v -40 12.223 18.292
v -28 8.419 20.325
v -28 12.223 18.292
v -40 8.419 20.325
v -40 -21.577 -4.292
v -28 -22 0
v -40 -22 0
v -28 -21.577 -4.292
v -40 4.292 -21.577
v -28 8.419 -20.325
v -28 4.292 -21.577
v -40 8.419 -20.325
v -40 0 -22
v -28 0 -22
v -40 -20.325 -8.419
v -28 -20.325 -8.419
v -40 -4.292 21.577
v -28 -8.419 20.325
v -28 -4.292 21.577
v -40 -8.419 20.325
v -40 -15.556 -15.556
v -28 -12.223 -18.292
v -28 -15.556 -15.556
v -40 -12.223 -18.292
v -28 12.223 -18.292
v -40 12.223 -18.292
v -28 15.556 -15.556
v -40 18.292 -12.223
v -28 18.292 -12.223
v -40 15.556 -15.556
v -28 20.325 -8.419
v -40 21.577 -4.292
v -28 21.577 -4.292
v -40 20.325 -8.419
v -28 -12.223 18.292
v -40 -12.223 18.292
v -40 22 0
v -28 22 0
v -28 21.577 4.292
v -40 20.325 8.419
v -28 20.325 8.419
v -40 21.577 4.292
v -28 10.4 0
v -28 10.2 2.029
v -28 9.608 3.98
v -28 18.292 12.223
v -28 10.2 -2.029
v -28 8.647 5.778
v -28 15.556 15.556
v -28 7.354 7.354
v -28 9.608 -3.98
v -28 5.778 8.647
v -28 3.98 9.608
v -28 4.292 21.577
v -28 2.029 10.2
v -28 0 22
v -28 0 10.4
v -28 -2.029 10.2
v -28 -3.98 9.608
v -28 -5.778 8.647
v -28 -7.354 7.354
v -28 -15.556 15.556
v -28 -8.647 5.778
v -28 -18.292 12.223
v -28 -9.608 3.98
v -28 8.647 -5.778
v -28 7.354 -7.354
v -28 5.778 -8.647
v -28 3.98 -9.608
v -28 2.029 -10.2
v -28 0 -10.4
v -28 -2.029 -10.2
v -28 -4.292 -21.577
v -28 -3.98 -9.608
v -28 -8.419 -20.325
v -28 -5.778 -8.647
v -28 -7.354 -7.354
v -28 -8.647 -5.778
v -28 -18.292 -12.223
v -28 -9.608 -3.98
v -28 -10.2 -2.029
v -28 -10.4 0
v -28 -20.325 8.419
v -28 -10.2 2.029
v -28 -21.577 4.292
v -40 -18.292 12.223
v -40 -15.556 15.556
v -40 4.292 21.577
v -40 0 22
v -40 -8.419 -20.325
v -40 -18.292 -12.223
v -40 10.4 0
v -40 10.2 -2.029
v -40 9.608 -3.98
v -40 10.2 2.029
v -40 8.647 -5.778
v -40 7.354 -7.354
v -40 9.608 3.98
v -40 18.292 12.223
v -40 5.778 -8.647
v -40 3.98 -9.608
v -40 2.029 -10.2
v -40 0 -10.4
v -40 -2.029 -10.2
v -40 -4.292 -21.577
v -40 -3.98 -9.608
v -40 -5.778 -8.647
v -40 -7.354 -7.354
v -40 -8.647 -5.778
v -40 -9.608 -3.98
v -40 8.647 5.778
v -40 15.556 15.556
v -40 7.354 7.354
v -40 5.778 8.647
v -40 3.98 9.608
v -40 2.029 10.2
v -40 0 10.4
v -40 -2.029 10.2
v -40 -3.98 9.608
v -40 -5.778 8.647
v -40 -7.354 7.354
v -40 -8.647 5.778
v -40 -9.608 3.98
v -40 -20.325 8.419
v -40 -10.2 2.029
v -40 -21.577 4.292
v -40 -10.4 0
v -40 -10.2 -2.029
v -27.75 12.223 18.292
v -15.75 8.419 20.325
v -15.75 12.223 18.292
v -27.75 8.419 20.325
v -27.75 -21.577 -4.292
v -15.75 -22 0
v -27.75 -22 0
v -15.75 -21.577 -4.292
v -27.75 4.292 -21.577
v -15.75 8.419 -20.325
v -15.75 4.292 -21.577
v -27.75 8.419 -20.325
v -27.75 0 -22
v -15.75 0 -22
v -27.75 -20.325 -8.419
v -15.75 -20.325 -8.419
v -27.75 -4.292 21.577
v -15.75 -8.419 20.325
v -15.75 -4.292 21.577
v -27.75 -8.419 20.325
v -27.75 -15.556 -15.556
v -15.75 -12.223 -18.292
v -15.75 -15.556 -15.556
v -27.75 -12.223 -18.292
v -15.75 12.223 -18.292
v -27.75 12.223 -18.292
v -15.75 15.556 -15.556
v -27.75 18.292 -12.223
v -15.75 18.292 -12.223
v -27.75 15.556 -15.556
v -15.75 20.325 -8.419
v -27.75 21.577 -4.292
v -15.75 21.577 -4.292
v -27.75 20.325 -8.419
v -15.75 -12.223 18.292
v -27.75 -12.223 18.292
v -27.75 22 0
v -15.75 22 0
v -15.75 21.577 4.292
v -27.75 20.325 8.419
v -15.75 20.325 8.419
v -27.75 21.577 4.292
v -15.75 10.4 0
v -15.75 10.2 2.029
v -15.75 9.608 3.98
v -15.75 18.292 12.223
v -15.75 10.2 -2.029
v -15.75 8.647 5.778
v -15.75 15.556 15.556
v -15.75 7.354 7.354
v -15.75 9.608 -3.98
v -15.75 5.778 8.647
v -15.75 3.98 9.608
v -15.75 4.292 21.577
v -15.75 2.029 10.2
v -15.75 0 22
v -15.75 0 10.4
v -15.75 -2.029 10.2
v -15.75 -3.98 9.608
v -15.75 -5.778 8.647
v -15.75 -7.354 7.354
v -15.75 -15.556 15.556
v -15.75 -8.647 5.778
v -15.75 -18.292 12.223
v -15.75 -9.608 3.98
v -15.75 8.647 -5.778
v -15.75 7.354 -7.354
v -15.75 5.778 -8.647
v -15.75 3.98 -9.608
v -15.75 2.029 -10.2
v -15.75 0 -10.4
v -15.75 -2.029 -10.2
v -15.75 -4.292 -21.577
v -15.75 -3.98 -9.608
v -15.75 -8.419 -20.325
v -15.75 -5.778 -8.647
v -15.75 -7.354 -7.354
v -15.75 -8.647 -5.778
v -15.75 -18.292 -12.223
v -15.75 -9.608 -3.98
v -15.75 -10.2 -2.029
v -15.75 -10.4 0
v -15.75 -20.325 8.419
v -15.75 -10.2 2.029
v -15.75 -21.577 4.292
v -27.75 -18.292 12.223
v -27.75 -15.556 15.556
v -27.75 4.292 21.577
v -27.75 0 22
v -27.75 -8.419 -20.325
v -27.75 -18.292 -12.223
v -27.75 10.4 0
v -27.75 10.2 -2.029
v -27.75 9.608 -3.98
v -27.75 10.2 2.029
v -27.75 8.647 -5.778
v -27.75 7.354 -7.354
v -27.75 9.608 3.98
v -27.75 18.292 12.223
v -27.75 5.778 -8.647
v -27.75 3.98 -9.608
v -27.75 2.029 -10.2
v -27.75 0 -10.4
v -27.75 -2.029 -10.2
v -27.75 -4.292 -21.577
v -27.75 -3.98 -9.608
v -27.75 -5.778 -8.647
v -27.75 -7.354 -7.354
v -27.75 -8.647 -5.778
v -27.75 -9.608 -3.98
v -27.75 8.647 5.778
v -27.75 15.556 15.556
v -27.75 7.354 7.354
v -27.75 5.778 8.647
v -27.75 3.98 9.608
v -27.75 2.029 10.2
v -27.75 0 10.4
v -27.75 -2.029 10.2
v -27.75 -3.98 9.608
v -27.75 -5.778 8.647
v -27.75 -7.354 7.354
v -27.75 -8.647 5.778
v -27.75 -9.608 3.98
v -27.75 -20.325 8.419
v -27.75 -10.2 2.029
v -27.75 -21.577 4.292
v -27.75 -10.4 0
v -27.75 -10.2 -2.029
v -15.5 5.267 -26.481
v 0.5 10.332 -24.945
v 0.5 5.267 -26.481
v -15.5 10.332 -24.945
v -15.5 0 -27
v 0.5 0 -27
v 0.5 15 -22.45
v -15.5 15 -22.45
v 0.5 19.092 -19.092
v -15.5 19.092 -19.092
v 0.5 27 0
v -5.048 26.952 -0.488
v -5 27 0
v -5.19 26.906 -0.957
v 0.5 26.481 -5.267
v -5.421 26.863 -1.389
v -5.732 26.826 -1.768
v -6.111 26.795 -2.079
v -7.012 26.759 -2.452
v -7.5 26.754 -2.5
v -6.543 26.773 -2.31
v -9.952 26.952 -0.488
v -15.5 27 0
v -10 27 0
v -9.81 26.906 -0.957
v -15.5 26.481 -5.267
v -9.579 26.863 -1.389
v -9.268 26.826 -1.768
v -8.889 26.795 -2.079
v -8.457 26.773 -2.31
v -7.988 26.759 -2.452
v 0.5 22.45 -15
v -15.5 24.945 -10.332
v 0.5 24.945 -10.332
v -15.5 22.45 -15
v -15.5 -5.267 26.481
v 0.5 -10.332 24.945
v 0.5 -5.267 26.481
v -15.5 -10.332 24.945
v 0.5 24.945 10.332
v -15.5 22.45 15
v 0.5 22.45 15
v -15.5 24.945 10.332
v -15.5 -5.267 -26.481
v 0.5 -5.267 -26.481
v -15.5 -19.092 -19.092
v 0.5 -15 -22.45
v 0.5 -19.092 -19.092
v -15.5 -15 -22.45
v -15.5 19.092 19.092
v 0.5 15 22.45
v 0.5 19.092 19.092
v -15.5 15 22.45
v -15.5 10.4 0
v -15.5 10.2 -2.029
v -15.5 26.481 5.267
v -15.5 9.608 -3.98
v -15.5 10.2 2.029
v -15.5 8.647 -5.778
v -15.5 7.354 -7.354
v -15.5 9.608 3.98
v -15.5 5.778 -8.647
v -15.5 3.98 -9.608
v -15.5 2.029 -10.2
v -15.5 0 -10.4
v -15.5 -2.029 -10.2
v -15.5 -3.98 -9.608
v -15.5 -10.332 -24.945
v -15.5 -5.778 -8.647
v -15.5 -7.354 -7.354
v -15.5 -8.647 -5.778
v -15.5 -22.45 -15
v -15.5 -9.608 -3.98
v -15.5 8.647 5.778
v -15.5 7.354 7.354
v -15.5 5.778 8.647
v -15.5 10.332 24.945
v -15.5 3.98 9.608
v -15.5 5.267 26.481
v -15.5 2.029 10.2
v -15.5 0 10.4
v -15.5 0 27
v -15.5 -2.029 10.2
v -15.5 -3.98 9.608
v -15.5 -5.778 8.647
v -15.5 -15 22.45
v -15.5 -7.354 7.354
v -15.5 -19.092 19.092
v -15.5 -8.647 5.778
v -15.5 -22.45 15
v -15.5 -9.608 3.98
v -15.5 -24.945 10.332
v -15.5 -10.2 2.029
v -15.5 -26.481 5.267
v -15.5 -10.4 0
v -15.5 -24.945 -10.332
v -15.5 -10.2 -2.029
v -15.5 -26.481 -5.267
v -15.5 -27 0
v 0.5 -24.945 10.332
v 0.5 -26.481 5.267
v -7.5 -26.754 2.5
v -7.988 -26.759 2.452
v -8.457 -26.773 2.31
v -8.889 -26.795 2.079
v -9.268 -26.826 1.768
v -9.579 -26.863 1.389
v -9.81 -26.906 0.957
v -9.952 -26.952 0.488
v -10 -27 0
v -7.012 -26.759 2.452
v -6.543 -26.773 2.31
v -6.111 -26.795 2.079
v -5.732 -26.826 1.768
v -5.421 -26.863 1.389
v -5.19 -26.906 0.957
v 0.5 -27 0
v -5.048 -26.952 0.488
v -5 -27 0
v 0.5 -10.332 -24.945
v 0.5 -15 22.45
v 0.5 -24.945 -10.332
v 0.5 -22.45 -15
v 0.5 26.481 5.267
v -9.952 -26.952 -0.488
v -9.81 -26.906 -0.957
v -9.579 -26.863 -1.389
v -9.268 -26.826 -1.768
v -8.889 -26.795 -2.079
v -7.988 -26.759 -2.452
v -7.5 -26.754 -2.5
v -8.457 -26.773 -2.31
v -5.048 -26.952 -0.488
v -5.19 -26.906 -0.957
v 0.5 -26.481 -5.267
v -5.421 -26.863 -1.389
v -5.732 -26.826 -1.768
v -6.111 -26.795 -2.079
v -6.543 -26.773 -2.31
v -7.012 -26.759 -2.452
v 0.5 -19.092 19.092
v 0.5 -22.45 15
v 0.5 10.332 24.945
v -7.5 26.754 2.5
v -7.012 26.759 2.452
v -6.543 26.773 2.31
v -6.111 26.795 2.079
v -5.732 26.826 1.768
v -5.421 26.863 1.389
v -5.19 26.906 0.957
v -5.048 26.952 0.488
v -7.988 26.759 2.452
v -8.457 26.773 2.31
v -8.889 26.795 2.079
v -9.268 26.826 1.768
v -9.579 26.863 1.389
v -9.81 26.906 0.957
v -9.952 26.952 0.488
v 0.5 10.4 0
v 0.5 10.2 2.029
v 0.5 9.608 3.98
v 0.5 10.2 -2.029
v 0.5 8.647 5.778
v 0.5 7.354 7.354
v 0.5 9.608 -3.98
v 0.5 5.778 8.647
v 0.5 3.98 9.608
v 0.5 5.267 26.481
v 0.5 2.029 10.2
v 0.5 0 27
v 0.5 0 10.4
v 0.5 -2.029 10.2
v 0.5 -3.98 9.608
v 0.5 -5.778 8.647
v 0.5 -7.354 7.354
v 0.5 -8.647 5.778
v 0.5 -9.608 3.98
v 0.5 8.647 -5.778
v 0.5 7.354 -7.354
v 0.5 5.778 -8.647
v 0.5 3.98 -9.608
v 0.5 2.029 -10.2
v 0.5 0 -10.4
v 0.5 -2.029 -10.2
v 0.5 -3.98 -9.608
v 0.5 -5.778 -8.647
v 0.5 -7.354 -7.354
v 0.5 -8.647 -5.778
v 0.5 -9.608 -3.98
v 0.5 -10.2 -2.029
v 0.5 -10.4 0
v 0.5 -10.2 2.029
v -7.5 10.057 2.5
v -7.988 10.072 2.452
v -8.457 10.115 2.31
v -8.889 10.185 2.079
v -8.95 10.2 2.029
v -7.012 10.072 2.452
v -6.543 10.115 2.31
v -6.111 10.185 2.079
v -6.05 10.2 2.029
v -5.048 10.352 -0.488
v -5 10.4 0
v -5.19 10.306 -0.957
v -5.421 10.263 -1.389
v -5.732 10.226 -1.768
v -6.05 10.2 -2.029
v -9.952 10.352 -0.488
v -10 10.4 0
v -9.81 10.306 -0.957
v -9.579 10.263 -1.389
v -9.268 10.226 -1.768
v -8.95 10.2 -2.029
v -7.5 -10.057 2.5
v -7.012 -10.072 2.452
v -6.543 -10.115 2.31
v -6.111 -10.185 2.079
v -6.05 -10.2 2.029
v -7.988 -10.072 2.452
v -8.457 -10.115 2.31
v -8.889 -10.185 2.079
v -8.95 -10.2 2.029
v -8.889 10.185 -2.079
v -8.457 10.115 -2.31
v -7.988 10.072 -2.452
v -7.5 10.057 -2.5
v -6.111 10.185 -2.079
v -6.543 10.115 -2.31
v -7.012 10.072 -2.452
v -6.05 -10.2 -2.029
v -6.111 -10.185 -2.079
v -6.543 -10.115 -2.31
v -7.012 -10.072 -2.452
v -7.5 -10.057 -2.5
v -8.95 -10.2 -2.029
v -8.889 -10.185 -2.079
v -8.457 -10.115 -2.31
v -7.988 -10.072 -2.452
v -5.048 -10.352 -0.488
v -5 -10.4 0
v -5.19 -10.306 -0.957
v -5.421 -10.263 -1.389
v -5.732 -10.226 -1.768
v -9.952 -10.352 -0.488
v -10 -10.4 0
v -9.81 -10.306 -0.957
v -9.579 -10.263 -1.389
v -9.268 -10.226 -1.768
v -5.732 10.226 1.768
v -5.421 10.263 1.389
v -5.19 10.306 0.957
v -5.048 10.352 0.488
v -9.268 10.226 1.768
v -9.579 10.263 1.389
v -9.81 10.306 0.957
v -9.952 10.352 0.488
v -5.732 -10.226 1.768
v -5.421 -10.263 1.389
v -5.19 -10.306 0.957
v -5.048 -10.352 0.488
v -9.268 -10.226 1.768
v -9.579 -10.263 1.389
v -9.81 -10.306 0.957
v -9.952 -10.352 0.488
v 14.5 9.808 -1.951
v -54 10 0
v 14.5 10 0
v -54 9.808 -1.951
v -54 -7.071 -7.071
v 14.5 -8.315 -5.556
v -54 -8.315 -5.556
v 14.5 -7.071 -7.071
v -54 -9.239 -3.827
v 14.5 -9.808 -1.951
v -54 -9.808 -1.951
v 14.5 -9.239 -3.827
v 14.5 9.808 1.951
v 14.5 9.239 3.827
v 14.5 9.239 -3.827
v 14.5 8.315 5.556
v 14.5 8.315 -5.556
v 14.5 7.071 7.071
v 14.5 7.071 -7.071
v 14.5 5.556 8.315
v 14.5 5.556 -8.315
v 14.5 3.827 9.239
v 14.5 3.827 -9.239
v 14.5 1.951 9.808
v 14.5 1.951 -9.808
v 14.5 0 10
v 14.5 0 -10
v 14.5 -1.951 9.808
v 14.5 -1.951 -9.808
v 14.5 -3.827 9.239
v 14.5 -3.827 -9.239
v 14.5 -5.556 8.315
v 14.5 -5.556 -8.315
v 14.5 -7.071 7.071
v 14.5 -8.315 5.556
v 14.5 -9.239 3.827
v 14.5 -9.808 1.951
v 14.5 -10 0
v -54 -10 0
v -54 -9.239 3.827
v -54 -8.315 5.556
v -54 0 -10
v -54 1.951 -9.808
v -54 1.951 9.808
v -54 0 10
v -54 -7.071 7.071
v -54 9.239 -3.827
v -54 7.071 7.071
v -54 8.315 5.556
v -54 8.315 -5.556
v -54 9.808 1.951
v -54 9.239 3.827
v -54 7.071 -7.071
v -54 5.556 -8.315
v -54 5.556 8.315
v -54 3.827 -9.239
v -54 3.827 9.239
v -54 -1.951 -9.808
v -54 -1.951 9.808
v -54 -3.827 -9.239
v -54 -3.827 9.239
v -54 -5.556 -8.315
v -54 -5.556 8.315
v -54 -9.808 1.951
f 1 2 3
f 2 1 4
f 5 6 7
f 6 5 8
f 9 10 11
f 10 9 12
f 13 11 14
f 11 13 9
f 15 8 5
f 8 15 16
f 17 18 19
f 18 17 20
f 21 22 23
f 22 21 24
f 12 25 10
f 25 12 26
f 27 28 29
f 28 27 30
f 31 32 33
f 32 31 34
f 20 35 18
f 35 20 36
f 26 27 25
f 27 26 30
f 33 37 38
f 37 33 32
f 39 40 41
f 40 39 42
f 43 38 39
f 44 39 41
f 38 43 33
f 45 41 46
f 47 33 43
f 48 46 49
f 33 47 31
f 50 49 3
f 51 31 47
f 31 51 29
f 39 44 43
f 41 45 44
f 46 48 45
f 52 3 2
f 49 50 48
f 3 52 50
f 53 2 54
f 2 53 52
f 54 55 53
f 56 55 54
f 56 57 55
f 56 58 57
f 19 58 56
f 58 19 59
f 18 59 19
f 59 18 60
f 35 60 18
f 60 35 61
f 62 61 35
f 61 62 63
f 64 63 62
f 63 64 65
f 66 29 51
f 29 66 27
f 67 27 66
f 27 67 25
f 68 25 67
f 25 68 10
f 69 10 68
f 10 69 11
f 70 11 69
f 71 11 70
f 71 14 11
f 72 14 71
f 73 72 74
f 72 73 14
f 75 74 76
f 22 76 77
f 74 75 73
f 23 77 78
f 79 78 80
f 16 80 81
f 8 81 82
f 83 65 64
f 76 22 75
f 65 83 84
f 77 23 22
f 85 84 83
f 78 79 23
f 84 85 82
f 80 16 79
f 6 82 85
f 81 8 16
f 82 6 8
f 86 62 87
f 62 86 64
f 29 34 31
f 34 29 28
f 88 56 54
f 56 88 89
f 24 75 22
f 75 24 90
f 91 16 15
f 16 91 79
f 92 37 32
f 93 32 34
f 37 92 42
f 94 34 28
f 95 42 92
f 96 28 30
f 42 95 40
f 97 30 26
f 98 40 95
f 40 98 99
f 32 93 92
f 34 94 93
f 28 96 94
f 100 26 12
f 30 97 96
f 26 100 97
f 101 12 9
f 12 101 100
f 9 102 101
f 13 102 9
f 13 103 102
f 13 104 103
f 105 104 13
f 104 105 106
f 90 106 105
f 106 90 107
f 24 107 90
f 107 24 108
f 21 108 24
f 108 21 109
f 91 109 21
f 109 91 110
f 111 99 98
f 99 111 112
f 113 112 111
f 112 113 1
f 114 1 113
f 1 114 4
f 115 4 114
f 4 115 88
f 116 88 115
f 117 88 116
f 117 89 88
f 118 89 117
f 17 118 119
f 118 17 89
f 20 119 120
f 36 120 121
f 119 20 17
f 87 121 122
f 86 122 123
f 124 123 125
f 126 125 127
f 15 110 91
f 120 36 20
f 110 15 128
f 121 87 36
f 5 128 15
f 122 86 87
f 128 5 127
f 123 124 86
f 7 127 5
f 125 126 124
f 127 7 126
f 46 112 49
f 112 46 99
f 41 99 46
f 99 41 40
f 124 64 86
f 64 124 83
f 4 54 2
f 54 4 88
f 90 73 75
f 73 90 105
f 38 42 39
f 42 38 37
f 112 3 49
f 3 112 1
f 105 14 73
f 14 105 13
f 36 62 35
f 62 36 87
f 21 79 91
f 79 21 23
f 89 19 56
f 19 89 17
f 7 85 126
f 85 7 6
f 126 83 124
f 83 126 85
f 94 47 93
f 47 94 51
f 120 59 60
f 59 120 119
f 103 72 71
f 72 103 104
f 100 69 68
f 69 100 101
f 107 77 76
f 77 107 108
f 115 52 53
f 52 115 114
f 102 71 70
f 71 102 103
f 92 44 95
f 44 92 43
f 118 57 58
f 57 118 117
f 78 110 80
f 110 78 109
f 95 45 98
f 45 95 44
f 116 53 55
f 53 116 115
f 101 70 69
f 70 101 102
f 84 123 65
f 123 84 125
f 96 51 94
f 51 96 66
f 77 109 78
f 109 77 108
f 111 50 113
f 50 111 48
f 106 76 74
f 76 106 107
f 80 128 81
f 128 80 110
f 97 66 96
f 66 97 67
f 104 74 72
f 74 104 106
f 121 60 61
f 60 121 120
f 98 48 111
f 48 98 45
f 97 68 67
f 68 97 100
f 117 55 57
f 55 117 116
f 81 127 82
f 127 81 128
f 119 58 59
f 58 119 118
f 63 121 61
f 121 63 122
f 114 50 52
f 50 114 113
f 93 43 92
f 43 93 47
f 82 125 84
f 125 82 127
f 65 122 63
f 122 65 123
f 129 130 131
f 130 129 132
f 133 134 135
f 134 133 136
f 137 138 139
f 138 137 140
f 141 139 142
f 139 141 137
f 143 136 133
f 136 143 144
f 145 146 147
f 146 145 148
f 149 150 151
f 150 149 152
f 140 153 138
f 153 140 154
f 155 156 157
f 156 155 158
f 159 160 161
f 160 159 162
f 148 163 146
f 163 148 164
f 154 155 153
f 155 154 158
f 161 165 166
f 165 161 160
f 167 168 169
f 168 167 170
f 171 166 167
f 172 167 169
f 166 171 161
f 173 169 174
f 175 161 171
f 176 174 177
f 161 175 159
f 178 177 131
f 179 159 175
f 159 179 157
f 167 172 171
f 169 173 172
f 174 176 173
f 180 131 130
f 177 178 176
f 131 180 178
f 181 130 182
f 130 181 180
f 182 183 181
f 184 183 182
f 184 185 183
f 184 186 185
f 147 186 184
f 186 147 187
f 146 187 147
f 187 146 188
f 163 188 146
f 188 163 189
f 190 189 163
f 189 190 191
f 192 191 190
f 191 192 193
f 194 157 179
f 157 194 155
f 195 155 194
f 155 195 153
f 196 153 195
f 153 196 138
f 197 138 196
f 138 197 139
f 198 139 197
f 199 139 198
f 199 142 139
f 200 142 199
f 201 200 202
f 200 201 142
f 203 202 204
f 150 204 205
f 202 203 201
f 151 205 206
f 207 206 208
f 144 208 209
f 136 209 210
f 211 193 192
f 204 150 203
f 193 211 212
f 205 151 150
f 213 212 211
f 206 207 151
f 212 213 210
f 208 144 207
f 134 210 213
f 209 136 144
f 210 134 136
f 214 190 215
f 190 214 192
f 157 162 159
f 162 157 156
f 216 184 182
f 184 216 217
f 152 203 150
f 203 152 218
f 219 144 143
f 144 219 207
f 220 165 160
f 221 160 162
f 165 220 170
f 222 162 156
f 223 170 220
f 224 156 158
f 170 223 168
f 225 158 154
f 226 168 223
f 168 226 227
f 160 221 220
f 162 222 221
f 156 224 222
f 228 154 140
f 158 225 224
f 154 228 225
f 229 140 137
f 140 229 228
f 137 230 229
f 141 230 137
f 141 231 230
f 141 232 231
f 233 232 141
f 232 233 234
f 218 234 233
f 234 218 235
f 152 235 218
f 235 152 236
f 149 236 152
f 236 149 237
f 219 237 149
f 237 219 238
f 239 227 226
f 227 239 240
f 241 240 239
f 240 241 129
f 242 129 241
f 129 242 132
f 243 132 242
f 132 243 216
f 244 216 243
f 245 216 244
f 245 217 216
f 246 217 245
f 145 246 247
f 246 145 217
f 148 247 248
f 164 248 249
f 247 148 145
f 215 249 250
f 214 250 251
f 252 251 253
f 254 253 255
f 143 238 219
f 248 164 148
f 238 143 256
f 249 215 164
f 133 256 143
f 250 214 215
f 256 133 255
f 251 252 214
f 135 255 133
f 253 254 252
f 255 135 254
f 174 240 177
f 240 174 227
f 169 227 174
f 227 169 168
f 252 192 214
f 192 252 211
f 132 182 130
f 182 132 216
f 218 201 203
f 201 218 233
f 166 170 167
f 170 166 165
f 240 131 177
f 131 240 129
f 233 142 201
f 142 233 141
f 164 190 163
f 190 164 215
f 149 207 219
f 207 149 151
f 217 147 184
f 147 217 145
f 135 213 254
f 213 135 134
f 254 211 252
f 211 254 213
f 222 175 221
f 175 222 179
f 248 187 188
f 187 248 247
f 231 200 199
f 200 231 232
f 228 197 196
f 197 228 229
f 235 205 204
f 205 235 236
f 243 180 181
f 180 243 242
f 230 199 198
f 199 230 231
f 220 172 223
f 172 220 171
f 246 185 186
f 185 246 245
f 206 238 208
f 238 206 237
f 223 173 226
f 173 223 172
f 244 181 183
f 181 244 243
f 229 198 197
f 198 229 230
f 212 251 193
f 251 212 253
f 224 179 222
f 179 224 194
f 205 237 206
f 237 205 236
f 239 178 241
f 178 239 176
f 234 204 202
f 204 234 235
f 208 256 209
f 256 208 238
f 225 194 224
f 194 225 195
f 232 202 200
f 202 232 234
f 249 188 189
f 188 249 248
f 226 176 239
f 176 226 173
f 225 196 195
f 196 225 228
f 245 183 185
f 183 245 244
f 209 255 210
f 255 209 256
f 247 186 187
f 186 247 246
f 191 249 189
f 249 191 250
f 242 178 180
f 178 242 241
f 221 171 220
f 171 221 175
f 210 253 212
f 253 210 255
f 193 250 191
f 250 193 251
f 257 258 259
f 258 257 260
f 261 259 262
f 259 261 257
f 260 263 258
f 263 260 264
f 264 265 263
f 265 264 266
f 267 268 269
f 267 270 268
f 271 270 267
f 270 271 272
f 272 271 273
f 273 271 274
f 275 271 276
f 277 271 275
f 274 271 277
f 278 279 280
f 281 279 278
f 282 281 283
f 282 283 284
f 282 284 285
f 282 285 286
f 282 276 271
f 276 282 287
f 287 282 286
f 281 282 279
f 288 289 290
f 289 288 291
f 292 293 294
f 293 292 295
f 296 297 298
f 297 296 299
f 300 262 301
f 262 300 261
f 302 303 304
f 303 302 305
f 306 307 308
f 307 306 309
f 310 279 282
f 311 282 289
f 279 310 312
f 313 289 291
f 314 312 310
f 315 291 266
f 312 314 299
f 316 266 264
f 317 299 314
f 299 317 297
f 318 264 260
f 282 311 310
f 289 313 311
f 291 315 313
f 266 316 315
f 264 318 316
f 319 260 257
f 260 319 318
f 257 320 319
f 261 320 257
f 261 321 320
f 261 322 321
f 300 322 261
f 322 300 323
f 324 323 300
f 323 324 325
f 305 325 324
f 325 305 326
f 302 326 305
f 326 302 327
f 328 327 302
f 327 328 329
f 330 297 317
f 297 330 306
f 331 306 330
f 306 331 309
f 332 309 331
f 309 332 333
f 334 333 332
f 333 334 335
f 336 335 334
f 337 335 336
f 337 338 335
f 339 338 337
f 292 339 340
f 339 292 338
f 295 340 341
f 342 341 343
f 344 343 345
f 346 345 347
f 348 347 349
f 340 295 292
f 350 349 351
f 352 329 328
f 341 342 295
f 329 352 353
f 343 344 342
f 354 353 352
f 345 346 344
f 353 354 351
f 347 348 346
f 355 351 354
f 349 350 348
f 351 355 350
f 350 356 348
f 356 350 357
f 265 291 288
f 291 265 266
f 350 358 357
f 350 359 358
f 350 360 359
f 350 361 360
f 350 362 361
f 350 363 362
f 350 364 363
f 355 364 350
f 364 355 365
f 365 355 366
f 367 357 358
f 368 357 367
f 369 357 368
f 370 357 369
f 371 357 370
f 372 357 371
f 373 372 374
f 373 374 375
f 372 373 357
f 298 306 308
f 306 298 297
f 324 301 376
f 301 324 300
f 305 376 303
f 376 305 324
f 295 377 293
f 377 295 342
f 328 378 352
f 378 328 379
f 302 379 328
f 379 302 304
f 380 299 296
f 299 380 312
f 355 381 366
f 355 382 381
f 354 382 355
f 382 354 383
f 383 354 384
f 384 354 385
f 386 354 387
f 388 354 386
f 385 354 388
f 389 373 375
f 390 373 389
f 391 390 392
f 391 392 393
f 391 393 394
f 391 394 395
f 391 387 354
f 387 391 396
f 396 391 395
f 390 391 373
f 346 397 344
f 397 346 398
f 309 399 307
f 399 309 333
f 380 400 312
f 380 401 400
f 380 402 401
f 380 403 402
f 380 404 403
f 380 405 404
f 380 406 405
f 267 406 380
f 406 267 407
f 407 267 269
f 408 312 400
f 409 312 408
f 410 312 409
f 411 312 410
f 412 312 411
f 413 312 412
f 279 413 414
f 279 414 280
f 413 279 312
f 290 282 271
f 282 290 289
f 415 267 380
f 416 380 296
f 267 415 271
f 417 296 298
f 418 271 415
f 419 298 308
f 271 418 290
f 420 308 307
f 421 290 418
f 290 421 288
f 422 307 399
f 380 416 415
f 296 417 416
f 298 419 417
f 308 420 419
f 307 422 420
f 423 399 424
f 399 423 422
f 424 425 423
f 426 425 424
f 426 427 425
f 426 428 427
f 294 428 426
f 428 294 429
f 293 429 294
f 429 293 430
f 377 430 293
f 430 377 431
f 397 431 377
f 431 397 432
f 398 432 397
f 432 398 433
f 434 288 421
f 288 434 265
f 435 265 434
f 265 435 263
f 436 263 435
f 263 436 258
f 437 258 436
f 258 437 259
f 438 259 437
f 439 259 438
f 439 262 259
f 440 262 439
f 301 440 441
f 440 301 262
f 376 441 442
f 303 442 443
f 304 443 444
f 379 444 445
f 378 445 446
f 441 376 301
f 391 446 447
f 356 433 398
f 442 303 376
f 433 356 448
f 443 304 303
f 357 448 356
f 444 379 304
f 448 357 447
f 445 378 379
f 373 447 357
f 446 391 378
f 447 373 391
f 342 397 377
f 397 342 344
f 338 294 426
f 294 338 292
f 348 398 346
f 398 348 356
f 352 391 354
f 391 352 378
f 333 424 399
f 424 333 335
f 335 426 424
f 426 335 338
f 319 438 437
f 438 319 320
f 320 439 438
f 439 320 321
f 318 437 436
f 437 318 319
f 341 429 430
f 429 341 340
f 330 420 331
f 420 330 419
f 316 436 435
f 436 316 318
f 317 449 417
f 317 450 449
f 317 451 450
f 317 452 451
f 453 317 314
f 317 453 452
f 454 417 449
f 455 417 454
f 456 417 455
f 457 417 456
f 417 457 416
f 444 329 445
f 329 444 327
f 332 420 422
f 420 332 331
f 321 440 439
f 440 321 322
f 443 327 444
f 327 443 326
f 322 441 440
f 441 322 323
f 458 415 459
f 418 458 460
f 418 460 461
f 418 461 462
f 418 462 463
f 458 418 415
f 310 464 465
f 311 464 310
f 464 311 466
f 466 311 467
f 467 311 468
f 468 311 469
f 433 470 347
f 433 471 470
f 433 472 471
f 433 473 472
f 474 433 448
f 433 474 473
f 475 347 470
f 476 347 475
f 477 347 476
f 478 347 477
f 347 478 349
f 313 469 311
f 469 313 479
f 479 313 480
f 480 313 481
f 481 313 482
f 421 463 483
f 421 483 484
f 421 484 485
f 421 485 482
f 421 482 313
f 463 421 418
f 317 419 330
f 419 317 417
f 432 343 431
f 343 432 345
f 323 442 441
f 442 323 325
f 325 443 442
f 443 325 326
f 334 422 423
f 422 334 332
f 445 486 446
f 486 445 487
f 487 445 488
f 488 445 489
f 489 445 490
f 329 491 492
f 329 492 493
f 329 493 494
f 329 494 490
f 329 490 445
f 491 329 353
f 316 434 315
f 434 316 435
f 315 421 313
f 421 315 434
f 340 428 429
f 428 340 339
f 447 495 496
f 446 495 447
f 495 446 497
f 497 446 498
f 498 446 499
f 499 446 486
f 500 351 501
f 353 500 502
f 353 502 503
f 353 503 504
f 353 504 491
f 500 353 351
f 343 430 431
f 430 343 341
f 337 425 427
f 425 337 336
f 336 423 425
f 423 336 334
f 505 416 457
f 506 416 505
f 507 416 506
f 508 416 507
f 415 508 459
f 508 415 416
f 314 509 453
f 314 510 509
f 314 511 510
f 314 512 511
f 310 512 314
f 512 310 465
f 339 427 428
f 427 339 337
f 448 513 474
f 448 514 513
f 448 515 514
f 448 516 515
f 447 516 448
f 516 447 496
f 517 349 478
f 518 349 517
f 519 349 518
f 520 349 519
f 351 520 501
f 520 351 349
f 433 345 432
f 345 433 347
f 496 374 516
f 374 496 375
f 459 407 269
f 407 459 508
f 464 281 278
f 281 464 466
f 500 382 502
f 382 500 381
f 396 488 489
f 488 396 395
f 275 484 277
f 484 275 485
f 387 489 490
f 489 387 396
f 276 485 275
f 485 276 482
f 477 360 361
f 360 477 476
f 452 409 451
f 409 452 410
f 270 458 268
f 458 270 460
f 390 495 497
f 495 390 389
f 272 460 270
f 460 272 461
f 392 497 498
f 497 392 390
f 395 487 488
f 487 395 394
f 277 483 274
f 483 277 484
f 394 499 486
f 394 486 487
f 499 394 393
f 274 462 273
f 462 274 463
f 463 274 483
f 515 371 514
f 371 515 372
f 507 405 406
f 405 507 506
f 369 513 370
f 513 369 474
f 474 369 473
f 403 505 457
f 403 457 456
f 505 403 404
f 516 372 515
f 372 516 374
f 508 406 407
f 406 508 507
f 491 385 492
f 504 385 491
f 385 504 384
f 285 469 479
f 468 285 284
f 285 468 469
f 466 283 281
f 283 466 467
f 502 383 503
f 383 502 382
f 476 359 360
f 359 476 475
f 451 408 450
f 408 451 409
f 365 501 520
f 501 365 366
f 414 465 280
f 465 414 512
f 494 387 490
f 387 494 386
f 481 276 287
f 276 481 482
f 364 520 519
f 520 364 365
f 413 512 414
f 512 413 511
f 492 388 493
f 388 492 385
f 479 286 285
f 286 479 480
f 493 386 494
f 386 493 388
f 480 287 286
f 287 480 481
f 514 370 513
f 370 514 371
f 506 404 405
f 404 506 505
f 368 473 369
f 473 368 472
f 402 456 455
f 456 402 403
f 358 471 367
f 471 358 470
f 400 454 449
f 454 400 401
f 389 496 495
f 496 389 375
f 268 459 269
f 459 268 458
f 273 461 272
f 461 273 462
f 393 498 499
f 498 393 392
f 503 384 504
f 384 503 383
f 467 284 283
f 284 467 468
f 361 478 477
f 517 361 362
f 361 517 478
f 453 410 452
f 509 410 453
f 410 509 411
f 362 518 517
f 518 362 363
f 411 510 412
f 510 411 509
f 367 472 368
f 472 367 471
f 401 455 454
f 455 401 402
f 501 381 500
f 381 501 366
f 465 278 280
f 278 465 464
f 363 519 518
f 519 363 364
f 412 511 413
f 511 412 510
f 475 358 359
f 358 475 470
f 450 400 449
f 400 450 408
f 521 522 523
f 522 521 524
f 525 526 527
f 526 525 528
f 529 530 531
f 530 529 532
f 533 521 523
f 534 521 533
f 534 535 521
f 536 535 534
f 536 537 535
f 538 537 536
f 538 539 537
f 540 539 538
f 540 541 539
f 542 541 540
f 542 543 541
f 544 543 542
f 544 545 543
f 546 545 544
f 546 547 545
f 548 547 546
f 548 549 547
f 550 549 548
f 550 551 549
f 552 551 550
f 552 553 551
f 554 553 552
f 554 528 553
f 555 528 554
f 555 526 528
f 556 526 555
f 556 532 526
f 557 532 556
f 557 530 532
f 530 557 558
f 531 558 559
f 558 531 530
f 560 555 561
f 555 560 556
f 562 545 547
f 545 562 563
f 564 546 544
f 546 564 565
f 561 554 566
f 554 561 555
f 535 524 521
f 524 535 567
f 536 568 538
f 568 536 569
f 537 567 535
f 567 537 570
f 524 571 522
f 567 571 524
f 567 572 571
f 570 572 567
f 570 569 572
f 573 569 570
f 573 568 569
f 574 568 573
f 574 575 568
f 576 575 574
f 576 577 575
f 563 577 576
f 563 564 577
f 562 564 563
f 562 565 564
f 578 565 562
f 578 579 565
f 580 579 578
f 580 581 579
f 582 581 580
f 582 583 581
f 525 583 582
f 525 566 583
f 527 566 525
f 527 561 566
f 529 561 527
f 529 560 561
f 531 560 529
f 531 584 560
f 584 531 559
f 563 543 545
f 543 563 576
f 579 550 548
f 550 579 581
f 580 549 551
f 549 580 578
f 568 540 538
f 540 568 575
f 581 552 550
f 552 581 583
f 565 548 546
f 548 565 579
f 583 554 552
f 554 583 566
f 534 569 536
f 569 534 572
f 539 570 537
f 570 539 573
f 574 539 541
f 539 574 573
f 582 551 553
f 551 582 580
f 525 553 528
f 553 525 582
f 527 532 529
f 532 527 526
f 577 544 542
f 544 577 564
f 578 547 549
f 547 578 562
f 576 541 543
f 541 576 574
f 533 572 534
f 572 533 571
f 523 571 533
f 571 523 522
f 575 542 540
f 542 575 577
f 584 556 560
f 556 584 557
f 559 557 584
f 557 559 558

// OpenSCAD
$fn = 32;

// ------------------------------------------------------------------------
// Shaft with rings and collars: d20 shaft, 3 rings
// Every part is its own module, assembly() places them once.
// ------------------------------------------------------------------------

// --- part 1 ---
module shaft() {
  translate([0, 0, -34.25]) cylinder(h = 68.5, d = 20);
}

// --- part 2 ---
module spacer_a() {
  difference() {
      translate([0, 0, 0]) cylinder(h = 12, d = 44);
      translate([0, 0, -1]) cylinder(h = 14, d = 20.8);
    }
}

// --- part 3 ---
module spacer_b() {
  difference() {
      translate([0, 0, 0]) cylinder(h = 12, d = 44);
      translate([0, 0, -1]) cylinder(h = 14, d = 20.8);
    }
}

// --- part 4 ---
module collar_a() {
  difference() {
    cylinder(h = 16, d = 54);
    translate([0, 0, -1]) cylinder(h = 18, d = 20.8);
    translate([0, 0, 8]) rotate([90, 0, 0]) cylinder(h = 56, d = 5, center = true);
  }
}

// --- assembly ---
module assembly() {
  translate([-19.75, 0, 0]) rotate([0, 90, 0]) shaft();
  translate([-40, 0, 0]) rotate([0, 90, 0]) spacer_a();
  translate([-27.75, 0, 0]) rotate([0, 90, 0]) spacer_b();
  translate([-15.5, 0, 0]) rotate([0, 90, 0]) collar_a();
}

assembly();
